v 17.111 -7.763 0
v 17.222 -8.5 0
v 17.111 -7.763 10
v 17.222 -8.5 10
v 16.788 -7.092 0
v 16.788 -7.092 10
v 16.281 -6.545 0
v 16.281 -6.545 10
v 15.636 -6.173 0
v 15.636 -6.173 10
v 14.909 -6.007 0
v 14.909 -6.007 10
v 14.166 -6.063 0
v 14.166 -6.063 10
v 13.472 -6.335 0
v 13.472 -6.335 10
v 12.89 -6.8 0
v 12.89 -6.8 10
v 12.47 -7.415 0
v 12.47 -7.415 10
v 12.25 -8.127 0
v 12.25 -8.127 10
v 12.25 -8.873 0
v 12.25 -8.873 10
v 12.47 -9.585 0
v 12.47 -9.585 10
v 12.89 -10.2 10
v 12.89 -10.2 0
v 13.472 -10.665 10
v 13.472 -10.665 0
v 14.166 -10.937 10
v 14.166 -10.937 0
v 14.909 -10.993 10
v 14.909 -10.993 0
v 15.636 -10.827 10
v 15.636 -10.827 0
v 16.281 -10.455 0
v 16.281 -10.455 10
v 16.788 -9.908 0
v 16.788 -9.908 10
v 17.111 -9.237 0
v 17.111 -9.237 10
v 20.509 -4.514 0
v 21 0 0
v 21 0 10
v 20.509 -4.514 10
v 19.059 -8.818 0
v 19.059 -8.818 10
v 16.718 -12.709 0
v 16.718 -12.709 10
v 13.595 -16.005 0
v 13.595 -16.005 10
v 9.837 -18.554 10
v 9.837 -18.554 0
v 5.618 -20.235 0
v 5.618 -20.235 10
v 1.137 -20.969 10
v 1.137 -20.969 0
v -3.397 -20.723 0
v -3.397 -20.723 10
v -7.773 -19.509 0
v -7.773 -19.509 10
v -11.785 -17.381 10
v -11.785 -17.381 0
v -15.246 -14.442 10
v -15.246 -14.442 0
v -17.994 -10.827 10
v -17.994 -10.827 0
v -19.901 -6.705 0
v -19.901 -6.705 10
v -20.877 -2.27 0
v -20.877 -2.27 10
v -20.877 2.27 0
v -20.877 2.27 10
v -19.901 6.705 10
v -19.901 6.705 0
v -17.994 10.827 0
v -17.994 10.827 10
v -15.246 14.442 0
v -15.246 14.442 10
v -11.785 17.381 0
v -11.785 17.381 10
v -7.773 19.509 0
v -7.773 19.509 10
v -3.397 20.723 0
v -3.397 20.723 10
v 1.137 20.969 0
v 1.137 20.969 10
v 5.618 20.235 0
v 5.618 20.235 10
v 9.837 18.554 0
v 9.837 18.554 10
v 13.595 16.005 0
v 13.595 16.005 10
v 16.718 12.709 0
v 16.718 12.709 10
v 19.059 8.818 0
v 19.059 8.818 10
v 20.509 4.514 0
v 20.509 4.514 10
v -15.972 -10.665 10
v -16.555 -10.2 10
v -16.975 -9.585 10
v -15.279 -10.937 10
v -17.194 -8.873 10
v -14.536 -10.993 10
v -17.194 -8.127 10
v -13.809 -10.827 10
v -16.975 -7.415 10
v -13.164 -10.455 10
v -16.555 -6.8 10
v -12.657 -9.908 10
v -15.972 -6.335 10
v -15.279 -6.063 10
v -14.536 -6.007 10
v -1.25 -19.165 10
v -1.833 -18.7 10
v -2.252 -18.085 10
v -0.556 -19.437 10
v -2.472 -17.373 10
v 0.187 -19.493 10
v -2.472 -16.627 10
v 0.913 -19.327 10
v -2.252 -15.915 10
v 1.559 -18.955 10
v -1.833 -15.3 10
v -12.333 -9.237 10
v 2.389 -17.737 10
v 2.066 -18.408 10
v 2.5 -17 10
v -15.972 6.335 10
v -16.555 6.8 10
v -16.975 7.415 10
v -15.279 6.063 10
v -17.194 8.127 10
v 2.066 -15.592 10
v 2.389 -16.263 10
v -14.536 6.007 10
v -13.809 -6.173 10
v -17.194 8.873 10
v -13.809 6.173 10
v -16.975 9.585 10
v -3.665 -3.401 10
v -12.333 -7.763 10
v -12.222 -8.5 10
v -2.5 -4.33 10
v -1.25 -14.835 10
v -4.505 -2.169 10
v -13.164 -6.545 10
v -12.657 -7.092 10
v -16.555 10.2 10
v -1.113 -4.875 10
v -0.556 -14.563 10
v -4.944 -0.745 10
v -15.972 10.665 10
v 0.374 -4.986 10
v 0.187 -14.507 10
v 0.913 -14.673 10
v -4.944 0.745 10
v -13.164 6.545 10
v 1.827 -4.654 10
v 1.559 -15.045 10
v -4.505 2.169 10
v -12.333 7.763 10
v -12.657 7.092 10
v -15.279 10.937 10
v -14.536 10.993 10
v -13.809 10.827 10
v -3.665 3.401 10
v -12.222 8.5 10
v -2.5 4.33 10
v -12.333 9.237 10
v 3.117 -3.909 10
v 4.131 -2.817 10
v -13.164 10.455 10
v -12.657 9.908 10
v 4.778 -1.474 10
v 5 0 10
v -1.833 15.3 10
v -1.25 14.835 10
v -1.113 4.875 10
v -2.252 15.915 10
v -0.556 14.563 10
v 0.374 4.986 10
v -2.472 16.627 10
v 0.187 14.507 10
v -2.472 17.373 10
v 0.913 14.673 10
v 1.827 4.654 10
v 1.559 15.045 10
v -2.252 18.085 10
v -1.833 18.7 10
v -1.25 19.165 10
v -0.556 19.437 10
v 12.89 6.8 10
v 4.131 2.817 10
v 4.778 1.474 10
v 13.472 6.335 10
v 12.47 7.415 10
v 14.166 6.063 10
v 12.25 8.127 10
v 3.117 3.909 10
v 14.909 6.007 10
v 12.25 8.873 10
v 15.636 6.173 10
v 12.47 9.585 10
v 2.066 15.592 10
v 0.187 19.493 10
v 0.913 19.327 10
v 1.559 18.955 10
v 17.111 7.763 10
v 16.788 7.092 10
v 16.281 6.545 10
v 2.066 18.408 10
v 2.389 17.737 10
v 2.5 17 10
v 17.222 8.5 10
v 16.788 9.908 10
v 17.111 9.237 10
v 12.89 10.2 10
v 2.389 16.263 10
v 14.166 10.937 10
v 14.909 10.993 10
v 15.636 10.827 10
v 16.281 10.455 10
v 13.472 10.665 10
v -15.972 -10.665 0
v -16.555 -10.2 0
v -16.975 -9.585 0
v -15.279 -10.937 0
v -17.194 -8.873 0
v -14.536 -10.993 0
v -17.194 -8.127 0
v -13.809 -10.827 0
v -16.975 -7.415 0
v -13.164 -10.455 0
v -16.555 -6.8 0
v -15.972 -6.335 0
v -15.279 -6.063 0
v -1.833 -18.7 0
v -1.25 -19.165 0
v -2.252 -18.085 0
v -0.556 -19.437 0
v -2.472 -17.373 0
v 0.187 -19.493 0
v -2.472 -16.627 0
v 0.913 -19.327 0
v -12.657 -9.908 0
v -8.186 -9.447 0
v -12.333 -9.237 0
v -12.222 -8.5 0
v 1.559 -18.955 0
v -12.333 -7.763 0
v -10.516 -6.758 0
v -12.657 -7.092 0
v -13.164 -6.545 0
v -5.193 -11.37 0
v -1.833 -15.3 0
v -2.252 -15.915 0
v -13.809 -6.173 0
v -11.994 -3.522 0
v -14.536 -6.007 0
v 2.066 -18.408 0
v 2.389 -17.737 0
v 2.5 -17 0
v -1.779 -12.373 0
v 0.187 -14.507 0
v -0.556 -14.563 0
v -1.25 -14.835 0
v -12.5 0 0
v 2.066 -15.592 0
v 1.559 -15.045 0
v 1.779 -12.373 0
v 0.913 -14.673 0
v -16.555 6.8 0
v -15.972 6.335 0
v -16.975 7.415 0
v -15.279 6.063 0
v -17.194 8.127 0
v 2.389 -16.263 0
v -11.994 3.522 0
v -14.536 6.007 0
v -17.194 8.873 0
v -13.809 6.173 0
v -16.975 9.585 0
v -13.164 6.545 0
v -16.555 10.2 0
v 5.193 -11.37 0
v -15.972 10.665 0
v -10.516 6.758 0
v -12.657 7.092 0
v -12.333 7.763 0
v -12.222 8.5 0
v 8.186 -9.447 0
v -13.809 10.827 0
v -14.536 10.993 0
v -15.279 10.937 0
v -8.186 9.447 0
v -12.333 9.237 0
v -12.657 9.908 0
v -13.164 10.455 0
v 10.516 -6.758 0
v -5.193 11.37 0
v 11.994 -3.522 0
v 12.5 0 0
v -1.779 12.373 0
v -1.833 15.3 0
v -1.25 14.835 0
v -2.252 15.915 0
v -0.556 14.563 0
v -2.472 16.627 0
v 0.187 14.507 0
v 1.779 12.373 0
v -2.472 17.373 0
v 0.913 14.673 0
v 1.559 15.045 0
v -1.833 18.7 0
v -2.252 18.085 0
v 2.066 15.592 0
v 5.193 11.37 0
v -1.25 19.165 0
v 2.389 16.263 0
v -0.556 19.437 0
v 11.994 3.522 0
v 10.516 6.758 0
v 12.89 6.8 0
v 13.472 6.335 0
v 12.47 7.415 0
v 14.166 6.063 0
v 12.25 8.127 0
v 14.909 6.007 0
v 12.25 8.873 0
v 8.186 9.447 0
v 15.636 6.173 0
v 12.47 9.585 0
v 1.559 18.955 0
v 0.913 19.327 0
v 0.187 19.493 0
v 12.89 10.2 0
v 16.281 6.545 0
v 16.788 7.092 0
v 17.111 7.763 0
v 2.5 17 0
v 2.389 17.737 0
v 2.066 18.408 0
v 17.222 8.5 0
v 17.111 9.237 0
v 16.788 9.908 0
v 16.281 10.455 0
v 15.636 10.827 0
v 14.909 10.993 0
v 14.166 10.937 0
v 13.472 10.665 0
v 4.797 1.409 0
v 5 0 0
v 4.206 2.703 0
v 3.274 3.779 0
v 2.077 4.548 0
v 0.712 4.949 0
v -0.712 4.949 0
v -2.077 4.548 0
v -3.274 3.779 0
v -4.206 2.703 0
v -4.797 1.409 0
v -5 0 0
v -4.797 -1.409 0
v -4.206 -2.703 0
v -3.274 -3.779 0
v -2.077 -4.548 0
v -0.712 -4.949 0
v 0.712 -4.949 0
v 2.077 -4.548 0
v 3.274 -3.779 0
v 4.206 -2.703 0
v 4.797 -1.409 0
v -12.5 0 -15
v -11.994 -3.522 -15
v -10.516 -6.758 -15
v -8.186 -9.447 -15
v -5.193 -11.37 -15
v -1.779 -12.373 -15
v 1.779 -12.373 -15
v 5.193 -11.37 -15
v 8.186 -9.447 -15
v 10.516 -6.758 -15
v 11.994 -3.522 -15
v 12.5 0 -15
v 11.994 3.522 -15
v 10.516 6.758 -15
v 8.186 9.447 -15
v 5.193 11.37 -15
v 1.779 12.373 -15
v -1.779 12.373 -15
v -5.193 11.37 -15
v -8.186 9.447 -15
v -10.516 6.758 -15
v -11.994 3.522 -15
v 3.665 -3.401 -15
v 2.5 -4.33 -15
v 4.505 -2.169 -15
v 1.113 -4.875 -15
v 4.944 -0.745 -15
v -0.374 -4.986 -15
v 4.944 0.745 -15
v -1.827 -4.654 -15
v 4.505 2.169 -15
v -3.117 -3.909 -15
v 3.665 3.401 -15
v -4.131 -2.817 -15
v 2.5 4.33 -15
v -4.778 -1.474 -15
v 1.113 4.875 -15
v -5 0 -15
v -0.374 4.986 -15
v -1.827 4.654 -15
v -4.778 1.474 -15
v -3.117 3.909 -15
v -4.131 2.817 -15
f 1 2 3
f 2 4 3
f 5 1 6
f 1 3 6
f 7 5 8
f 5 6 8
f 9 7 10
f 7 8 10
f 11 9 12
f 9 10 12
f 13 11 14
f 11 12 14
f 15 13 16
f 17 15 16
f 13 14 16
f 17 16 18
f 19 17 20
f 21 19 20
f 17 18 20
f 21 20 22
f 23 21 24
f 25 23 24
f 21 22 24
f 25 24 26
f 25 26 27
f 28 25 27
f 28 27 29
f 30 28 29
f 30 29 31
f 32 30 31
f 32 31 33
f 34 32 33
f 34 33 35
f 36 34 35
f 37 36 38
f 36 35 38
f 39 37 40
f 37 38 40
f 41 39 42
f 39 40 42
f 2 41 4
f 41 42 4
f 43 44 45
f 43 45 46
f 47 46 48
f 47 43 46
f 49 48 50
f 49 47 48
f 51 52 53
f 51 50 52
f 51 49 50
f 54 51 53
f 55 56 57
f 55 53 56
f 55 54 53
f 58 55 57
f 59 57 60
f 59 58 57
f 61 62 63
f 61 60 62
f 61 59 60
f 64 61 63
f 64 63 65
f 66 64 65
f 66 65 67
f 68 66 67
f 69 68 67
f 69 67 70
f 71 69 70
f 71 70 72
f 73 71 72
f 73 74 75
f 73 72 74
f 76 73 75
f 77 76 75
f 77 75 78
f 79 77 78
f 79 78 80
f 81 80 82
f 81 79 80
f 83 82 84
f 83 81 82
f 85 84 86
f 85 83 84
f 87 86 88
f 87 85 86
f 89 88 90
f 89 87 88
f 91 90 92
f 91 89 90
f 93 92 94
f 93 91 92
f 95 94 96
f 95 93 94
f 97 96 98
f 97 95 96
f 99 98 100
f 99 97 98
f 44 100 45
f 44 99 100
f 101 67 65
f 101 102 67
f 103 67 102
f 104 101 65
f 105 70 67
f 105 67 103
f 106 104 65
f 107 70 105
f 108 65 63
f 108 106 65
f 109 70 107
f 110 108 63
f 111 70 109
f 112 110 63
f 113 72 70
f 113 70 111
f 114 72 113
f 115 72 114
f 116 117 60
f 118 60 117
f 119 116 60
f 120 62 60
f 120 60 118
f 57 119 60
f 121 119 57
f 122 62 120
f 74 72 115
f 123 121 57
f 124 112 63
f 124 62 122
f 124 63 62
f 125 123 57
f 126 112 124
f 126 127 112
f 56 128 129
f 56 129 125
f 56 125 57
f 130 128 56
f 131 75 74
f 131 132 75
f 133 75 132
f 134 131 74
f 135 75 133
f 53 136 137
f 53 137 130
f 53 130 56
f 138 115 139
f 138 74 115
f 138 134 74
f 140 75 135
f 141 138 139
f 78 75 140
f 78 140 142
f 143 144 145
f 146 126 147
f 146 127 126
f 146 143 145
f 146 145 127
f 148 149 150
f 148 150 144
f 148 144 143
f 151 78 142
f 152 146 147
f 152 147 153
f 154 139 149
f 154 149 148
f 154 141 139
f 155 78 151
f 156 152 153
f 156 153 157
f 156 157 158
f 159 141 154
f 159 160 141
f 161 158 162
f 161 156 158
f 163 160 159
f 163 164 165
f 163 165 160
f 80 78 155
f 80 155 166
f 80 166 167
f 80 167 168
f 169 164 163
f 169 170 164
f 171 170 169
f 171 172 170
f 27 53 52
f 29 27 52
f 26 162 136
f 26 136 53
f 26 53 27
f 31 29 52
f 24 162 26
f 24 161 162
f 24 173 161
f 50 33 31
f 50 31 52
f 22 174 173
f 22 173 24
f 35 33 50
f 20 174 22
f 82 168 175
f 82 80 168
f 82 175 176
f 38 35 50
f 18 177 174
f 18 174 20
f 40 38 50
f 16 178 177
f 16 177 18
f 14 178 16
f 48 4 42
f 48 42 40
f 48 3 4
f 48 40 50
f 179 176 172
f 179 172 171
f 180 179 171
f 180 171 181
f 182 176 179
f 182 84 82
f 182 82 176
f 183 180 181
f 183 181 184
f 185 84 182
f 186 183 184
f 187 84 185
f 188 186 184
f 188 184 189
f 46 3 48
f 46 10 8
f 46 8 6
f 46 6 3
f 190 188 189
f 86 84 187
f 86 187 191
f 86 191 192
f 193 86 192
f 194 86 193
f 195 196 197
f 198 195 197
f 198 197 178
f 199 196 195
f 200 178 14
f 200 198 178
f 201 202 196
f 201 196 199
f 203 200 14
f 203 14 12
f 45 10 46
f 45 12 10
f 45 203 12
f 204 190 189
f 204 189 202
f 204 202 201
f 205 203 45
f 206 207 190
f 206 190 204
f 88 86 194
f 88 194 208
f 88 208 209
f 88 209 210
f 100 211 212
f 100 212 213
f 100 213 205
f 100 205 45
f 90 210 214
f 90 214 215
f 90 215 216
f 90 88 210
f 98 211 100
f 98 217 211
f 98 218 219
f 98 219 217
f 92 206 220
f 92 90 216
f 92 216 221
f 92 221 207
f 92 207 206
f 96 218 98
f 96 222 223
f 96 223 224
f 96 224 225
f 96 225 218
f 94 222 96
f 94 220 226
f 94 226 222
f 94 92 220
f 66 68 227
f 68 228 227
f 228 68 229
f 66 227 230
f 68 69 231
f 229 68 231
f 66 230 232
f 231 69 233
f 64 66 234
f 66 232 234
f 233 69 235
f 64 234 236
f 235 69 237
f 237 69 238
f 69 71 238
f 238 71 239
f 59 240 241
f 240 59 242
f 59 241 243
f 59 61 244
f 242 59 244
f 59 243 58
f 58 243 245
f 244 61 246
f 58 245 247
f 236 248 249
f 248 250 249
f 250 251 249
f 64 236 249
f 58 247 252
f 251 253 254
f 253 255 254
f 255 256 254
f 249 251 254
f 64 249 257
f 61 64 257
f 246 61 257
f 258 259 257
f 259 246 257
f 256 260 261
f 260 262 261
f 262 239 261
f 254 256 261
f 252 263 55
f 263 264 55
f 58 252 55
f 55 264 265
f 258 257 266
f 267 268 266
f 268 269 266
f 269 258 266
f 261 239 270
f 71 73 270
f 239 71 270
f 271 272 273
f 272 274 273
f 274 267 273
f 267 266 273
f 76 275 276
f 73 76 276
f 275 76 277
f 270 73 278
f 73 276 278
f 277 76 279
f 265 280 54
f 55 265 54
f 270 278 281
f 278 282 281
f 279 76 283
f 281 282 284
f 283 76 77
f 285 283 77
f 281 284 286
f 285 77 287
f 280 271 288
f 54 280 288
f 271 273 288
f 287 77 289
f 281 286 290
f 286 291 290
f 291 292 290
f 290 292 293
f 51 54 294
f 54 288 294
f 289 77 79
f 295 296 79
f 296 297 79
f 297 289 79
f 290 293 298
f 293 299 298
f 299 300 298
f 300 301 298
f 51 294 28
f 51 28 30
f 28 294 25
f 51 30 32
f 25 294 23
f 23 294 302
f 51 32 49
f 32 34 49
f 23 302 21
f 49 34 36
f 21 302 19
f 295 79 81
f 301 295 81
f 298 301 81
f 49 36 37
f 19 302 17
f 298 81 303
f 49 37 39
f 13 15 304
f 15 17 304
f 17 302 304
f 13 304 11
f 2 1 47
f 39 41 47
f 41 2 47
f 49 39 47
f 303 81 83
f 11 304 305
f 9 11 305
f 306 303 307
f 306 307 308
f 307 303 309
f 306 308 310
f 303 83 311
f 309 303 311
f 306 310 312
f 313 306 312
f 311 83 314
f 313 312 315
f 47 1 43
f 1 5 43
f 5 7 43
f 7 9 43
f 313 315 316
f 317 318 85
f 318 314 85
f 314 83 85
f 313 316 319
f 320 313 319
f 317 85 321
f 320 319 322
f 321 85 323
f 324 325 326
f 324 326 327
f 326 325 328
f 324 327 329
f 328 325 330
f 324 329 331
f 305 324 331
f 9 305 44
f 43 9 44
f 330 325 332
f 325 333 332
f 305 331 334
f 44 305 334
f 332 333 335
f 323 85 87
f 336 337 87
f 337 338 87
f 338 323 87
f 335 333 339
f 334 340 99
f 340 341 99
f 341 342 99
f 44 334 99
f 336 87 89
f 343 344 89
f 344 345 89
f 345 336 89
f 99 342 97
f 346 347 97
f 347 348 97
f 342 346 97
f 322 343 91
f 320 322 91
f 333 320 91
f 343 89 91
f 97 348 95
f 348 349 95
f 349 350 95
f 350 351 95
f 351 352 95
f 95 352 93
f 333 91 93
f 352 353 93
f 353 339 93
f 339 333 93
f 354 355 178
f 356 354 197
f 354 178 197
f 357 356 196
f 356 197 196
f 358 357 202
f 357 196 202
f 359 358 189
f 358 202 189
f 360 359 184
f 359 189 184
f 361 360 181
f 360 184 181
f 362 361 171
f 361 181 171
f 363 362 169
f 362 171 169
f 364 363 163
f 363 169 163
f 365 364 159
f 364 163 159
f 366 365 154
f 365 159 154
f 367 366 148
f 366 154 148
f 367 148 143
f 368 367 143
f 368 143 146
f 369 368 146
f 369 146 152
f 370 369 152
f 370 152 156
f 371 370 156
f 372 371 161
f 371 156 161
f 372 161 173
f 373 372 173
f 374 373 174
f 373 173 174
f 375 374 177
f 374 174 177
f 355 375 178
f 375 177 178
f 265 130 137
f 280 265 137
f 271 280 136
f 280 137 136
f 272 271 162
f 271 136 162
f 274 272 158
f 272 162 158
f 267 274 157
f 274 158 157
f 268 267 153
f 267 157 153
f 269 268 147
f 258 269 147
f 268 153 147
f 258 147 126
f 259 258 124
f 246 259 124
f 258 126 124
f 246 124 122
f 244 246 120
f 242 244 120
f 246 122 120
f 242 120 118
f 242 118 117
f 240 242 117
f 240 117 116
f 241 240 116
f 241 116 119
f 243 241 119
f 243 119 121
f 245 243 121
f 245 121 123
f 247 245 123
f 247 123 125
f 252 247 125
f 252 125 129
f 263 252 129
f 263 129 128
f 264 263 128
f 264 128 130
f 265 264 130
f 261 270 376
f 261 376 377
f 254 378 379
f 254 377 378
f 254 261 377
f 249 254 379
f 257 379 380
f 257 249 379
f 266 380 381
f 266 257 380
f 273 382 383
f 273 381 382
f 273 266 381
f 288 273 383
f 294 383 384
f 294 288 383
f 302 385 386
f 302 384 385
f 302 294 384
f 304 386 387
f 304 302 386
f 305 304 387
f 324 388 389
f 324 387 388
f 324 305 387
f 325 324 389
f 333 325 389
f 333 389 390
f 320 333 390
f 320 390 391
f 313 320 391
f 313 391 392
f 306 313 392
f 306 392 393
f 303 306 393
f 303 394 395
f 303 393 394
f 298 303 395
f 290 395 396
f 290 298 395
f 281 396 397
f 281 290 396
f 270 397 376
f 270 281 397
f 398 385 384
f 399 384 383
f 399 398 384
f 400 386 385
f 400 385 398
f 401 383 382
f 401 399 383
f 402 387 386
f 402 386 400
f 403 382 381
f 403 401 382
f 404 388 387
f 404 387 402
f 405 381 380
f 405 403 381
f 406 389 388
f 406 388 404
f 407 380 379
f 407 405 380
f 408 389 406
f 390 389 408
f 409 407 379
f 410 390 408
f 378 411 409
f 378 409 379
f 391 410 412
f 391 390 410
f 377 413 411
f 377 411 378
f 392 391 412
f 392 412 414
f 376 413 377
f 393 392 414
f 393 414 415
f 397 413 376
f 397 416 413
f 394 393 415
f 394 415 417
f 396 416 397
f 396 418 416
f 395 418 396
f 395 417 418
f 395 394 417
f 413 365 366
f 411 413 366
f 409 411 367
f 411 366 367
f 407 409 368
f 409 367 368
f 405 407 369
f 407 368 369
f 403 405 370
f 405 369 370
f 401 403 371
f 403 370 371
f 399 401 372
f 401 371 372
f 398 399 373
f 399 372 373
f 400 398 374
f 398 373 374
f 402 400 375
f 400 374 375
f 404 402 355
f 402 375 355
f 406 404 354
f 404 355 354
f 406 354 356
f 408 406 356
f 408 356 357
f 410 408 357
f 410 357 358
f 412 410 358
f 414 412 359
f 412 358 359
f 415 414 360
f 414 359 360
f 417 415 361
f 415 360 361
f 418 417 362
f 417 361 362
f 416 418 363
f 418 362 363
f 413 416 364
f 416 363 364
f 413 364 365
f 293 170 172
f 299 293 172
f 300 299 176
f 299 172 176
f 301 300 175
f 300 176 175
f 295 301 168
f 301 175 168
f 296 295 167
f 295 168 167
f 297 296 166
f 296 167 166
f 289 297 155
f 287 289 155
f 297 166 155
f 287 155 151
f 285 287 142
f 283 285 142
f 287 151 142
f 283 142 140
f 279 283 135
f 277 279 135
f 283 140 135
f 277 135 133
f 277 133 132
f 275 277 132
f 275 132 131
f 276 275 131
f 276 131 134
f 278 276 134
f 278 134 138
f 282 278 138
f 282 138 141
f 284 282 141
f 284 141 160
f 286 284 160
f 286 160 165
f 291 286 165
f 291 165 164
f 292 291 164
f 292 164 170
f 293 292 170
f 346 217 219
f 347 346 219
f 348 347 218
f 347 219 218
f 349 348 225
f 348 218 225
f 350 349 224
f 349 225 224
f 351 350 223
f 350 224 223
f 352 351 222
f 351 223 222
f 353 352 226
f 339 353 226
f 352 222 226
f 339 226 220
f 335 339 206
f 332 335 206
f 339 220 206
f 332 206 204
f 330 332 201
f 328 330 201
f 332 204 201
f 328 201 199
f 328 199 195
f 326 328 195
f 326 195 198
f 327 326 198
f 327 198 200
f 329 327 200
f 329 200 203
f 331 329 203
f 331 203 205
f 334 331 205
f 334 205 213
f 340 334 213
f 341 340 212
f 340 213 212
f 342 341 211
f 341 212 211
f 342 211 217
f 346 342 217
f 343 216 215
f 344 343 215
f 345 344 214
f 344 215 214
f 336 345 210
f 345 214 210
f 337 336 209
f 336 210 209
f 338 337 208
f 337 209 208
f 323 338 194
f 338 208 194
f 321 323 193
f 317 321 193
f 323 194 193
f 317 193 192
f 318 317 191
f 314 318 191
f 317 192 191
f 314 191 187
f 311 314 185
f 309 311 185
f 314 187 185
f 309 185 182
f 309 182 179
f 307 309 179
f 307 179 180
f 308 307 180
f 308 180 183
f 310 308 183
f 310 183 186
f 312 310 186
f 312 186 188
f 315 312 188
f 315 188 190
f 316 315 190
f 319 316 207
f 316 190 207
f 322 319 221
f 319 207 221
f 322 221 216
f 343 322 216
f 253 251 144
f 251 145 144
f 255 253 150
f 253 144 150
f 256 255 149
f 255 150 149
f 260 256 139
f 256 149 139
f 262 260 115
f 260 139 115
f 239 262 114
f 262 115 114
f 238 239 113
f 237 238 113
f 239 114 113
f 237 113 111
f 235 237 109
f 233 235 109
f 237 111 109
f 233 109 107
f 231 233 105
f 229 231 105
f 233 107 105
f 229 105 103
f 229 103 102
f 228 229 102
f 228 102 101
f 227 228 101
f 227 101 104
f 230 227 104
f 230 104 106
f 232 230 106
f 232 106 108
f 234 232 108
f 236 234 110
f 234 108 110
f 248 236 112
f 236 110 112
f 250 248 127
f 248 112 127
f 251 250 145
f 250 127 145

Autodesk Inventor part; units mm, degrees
ref_plane "YZ Plane" through (0, 0, 0) normal (1, 0, 0) x (0, 1, 0)
ref_plane "XZ Plane" through (0, 0, 0) normal (0, 1, 0) x (-1, 0, 0)
ref_plane "XY Plane" through (0, 0, 0) normal (0, 0, 1) x (1, 0, 0)
sketch "Szkic1" plane through (0, 0, 0) normal (0, 0, 1) x (1, 0, 0)
  circle A0 centre (0, 0) radius 21
  dimension "d0" = 42
extrude "Wyciągnięcie proste1" add sketch "Szkic1" along normal blind 10
sketch "Szkic2" plane through (0, 0, 10) normal (0, 0, 1) x (1, 0, 0)
  circle A0 centre (0, 0) radius 17
  circle A1 centre (0, 17) radius 2.5
  circle A2 centre (14.7224, 8.5) radius 2.5
  circle A3 centre (14.7224, -8.5) radius 2.5
  circle A4 centre (0, -17) radius 2.5
  circle A5 centre (-14.7224, -8.5) radius 2.5
  circle A6 centre (-14.7224, 8.5) radius 2.5
  dimension "d3" = 34
  dimension "d4" = 5
  dimension "d7" = 360
extrude "Wyciągnięcie proste2" cut sketch "Szkic2" against normal up to next contours A2 A0 | A0 A2 | A3 A0 | A0 A3 | A1 A0 | A0 A1 | A4 A0 | A0 A4 | A6 A0 | A0 A6 | A5 A0 | A0 A5
sketch "Szkic3" plane through (0, 0, 10) normal (0, 0, 1) x (1, 0, 0)
  circle A0 centre (0, 0) radius 5
  dimension "d11" = 10
extrude "Wyciągnięcie proste3" cut sketch "Szkic3" against normal up to next
sketch "Szkic4" plane through (0, 0, 0) normal (0, 0, -1) x (-1, 0, 0)
  circle A0 centre (0, 0) radius 5 projected
  circle A1 centre (0, 0) radius 12.5
  dimension "d14" = 25
extrude "Wyciągnięcie proste4" add sketch "Szkic4" along normal blind 15
thread "Gwint1" size "TR10x2" class "7H" standard "ISO Metric Trapezoidal Threads" full length
properties part number "Nakrętka trapezowa kołnierzowa JFRM-2525TR10x3"
